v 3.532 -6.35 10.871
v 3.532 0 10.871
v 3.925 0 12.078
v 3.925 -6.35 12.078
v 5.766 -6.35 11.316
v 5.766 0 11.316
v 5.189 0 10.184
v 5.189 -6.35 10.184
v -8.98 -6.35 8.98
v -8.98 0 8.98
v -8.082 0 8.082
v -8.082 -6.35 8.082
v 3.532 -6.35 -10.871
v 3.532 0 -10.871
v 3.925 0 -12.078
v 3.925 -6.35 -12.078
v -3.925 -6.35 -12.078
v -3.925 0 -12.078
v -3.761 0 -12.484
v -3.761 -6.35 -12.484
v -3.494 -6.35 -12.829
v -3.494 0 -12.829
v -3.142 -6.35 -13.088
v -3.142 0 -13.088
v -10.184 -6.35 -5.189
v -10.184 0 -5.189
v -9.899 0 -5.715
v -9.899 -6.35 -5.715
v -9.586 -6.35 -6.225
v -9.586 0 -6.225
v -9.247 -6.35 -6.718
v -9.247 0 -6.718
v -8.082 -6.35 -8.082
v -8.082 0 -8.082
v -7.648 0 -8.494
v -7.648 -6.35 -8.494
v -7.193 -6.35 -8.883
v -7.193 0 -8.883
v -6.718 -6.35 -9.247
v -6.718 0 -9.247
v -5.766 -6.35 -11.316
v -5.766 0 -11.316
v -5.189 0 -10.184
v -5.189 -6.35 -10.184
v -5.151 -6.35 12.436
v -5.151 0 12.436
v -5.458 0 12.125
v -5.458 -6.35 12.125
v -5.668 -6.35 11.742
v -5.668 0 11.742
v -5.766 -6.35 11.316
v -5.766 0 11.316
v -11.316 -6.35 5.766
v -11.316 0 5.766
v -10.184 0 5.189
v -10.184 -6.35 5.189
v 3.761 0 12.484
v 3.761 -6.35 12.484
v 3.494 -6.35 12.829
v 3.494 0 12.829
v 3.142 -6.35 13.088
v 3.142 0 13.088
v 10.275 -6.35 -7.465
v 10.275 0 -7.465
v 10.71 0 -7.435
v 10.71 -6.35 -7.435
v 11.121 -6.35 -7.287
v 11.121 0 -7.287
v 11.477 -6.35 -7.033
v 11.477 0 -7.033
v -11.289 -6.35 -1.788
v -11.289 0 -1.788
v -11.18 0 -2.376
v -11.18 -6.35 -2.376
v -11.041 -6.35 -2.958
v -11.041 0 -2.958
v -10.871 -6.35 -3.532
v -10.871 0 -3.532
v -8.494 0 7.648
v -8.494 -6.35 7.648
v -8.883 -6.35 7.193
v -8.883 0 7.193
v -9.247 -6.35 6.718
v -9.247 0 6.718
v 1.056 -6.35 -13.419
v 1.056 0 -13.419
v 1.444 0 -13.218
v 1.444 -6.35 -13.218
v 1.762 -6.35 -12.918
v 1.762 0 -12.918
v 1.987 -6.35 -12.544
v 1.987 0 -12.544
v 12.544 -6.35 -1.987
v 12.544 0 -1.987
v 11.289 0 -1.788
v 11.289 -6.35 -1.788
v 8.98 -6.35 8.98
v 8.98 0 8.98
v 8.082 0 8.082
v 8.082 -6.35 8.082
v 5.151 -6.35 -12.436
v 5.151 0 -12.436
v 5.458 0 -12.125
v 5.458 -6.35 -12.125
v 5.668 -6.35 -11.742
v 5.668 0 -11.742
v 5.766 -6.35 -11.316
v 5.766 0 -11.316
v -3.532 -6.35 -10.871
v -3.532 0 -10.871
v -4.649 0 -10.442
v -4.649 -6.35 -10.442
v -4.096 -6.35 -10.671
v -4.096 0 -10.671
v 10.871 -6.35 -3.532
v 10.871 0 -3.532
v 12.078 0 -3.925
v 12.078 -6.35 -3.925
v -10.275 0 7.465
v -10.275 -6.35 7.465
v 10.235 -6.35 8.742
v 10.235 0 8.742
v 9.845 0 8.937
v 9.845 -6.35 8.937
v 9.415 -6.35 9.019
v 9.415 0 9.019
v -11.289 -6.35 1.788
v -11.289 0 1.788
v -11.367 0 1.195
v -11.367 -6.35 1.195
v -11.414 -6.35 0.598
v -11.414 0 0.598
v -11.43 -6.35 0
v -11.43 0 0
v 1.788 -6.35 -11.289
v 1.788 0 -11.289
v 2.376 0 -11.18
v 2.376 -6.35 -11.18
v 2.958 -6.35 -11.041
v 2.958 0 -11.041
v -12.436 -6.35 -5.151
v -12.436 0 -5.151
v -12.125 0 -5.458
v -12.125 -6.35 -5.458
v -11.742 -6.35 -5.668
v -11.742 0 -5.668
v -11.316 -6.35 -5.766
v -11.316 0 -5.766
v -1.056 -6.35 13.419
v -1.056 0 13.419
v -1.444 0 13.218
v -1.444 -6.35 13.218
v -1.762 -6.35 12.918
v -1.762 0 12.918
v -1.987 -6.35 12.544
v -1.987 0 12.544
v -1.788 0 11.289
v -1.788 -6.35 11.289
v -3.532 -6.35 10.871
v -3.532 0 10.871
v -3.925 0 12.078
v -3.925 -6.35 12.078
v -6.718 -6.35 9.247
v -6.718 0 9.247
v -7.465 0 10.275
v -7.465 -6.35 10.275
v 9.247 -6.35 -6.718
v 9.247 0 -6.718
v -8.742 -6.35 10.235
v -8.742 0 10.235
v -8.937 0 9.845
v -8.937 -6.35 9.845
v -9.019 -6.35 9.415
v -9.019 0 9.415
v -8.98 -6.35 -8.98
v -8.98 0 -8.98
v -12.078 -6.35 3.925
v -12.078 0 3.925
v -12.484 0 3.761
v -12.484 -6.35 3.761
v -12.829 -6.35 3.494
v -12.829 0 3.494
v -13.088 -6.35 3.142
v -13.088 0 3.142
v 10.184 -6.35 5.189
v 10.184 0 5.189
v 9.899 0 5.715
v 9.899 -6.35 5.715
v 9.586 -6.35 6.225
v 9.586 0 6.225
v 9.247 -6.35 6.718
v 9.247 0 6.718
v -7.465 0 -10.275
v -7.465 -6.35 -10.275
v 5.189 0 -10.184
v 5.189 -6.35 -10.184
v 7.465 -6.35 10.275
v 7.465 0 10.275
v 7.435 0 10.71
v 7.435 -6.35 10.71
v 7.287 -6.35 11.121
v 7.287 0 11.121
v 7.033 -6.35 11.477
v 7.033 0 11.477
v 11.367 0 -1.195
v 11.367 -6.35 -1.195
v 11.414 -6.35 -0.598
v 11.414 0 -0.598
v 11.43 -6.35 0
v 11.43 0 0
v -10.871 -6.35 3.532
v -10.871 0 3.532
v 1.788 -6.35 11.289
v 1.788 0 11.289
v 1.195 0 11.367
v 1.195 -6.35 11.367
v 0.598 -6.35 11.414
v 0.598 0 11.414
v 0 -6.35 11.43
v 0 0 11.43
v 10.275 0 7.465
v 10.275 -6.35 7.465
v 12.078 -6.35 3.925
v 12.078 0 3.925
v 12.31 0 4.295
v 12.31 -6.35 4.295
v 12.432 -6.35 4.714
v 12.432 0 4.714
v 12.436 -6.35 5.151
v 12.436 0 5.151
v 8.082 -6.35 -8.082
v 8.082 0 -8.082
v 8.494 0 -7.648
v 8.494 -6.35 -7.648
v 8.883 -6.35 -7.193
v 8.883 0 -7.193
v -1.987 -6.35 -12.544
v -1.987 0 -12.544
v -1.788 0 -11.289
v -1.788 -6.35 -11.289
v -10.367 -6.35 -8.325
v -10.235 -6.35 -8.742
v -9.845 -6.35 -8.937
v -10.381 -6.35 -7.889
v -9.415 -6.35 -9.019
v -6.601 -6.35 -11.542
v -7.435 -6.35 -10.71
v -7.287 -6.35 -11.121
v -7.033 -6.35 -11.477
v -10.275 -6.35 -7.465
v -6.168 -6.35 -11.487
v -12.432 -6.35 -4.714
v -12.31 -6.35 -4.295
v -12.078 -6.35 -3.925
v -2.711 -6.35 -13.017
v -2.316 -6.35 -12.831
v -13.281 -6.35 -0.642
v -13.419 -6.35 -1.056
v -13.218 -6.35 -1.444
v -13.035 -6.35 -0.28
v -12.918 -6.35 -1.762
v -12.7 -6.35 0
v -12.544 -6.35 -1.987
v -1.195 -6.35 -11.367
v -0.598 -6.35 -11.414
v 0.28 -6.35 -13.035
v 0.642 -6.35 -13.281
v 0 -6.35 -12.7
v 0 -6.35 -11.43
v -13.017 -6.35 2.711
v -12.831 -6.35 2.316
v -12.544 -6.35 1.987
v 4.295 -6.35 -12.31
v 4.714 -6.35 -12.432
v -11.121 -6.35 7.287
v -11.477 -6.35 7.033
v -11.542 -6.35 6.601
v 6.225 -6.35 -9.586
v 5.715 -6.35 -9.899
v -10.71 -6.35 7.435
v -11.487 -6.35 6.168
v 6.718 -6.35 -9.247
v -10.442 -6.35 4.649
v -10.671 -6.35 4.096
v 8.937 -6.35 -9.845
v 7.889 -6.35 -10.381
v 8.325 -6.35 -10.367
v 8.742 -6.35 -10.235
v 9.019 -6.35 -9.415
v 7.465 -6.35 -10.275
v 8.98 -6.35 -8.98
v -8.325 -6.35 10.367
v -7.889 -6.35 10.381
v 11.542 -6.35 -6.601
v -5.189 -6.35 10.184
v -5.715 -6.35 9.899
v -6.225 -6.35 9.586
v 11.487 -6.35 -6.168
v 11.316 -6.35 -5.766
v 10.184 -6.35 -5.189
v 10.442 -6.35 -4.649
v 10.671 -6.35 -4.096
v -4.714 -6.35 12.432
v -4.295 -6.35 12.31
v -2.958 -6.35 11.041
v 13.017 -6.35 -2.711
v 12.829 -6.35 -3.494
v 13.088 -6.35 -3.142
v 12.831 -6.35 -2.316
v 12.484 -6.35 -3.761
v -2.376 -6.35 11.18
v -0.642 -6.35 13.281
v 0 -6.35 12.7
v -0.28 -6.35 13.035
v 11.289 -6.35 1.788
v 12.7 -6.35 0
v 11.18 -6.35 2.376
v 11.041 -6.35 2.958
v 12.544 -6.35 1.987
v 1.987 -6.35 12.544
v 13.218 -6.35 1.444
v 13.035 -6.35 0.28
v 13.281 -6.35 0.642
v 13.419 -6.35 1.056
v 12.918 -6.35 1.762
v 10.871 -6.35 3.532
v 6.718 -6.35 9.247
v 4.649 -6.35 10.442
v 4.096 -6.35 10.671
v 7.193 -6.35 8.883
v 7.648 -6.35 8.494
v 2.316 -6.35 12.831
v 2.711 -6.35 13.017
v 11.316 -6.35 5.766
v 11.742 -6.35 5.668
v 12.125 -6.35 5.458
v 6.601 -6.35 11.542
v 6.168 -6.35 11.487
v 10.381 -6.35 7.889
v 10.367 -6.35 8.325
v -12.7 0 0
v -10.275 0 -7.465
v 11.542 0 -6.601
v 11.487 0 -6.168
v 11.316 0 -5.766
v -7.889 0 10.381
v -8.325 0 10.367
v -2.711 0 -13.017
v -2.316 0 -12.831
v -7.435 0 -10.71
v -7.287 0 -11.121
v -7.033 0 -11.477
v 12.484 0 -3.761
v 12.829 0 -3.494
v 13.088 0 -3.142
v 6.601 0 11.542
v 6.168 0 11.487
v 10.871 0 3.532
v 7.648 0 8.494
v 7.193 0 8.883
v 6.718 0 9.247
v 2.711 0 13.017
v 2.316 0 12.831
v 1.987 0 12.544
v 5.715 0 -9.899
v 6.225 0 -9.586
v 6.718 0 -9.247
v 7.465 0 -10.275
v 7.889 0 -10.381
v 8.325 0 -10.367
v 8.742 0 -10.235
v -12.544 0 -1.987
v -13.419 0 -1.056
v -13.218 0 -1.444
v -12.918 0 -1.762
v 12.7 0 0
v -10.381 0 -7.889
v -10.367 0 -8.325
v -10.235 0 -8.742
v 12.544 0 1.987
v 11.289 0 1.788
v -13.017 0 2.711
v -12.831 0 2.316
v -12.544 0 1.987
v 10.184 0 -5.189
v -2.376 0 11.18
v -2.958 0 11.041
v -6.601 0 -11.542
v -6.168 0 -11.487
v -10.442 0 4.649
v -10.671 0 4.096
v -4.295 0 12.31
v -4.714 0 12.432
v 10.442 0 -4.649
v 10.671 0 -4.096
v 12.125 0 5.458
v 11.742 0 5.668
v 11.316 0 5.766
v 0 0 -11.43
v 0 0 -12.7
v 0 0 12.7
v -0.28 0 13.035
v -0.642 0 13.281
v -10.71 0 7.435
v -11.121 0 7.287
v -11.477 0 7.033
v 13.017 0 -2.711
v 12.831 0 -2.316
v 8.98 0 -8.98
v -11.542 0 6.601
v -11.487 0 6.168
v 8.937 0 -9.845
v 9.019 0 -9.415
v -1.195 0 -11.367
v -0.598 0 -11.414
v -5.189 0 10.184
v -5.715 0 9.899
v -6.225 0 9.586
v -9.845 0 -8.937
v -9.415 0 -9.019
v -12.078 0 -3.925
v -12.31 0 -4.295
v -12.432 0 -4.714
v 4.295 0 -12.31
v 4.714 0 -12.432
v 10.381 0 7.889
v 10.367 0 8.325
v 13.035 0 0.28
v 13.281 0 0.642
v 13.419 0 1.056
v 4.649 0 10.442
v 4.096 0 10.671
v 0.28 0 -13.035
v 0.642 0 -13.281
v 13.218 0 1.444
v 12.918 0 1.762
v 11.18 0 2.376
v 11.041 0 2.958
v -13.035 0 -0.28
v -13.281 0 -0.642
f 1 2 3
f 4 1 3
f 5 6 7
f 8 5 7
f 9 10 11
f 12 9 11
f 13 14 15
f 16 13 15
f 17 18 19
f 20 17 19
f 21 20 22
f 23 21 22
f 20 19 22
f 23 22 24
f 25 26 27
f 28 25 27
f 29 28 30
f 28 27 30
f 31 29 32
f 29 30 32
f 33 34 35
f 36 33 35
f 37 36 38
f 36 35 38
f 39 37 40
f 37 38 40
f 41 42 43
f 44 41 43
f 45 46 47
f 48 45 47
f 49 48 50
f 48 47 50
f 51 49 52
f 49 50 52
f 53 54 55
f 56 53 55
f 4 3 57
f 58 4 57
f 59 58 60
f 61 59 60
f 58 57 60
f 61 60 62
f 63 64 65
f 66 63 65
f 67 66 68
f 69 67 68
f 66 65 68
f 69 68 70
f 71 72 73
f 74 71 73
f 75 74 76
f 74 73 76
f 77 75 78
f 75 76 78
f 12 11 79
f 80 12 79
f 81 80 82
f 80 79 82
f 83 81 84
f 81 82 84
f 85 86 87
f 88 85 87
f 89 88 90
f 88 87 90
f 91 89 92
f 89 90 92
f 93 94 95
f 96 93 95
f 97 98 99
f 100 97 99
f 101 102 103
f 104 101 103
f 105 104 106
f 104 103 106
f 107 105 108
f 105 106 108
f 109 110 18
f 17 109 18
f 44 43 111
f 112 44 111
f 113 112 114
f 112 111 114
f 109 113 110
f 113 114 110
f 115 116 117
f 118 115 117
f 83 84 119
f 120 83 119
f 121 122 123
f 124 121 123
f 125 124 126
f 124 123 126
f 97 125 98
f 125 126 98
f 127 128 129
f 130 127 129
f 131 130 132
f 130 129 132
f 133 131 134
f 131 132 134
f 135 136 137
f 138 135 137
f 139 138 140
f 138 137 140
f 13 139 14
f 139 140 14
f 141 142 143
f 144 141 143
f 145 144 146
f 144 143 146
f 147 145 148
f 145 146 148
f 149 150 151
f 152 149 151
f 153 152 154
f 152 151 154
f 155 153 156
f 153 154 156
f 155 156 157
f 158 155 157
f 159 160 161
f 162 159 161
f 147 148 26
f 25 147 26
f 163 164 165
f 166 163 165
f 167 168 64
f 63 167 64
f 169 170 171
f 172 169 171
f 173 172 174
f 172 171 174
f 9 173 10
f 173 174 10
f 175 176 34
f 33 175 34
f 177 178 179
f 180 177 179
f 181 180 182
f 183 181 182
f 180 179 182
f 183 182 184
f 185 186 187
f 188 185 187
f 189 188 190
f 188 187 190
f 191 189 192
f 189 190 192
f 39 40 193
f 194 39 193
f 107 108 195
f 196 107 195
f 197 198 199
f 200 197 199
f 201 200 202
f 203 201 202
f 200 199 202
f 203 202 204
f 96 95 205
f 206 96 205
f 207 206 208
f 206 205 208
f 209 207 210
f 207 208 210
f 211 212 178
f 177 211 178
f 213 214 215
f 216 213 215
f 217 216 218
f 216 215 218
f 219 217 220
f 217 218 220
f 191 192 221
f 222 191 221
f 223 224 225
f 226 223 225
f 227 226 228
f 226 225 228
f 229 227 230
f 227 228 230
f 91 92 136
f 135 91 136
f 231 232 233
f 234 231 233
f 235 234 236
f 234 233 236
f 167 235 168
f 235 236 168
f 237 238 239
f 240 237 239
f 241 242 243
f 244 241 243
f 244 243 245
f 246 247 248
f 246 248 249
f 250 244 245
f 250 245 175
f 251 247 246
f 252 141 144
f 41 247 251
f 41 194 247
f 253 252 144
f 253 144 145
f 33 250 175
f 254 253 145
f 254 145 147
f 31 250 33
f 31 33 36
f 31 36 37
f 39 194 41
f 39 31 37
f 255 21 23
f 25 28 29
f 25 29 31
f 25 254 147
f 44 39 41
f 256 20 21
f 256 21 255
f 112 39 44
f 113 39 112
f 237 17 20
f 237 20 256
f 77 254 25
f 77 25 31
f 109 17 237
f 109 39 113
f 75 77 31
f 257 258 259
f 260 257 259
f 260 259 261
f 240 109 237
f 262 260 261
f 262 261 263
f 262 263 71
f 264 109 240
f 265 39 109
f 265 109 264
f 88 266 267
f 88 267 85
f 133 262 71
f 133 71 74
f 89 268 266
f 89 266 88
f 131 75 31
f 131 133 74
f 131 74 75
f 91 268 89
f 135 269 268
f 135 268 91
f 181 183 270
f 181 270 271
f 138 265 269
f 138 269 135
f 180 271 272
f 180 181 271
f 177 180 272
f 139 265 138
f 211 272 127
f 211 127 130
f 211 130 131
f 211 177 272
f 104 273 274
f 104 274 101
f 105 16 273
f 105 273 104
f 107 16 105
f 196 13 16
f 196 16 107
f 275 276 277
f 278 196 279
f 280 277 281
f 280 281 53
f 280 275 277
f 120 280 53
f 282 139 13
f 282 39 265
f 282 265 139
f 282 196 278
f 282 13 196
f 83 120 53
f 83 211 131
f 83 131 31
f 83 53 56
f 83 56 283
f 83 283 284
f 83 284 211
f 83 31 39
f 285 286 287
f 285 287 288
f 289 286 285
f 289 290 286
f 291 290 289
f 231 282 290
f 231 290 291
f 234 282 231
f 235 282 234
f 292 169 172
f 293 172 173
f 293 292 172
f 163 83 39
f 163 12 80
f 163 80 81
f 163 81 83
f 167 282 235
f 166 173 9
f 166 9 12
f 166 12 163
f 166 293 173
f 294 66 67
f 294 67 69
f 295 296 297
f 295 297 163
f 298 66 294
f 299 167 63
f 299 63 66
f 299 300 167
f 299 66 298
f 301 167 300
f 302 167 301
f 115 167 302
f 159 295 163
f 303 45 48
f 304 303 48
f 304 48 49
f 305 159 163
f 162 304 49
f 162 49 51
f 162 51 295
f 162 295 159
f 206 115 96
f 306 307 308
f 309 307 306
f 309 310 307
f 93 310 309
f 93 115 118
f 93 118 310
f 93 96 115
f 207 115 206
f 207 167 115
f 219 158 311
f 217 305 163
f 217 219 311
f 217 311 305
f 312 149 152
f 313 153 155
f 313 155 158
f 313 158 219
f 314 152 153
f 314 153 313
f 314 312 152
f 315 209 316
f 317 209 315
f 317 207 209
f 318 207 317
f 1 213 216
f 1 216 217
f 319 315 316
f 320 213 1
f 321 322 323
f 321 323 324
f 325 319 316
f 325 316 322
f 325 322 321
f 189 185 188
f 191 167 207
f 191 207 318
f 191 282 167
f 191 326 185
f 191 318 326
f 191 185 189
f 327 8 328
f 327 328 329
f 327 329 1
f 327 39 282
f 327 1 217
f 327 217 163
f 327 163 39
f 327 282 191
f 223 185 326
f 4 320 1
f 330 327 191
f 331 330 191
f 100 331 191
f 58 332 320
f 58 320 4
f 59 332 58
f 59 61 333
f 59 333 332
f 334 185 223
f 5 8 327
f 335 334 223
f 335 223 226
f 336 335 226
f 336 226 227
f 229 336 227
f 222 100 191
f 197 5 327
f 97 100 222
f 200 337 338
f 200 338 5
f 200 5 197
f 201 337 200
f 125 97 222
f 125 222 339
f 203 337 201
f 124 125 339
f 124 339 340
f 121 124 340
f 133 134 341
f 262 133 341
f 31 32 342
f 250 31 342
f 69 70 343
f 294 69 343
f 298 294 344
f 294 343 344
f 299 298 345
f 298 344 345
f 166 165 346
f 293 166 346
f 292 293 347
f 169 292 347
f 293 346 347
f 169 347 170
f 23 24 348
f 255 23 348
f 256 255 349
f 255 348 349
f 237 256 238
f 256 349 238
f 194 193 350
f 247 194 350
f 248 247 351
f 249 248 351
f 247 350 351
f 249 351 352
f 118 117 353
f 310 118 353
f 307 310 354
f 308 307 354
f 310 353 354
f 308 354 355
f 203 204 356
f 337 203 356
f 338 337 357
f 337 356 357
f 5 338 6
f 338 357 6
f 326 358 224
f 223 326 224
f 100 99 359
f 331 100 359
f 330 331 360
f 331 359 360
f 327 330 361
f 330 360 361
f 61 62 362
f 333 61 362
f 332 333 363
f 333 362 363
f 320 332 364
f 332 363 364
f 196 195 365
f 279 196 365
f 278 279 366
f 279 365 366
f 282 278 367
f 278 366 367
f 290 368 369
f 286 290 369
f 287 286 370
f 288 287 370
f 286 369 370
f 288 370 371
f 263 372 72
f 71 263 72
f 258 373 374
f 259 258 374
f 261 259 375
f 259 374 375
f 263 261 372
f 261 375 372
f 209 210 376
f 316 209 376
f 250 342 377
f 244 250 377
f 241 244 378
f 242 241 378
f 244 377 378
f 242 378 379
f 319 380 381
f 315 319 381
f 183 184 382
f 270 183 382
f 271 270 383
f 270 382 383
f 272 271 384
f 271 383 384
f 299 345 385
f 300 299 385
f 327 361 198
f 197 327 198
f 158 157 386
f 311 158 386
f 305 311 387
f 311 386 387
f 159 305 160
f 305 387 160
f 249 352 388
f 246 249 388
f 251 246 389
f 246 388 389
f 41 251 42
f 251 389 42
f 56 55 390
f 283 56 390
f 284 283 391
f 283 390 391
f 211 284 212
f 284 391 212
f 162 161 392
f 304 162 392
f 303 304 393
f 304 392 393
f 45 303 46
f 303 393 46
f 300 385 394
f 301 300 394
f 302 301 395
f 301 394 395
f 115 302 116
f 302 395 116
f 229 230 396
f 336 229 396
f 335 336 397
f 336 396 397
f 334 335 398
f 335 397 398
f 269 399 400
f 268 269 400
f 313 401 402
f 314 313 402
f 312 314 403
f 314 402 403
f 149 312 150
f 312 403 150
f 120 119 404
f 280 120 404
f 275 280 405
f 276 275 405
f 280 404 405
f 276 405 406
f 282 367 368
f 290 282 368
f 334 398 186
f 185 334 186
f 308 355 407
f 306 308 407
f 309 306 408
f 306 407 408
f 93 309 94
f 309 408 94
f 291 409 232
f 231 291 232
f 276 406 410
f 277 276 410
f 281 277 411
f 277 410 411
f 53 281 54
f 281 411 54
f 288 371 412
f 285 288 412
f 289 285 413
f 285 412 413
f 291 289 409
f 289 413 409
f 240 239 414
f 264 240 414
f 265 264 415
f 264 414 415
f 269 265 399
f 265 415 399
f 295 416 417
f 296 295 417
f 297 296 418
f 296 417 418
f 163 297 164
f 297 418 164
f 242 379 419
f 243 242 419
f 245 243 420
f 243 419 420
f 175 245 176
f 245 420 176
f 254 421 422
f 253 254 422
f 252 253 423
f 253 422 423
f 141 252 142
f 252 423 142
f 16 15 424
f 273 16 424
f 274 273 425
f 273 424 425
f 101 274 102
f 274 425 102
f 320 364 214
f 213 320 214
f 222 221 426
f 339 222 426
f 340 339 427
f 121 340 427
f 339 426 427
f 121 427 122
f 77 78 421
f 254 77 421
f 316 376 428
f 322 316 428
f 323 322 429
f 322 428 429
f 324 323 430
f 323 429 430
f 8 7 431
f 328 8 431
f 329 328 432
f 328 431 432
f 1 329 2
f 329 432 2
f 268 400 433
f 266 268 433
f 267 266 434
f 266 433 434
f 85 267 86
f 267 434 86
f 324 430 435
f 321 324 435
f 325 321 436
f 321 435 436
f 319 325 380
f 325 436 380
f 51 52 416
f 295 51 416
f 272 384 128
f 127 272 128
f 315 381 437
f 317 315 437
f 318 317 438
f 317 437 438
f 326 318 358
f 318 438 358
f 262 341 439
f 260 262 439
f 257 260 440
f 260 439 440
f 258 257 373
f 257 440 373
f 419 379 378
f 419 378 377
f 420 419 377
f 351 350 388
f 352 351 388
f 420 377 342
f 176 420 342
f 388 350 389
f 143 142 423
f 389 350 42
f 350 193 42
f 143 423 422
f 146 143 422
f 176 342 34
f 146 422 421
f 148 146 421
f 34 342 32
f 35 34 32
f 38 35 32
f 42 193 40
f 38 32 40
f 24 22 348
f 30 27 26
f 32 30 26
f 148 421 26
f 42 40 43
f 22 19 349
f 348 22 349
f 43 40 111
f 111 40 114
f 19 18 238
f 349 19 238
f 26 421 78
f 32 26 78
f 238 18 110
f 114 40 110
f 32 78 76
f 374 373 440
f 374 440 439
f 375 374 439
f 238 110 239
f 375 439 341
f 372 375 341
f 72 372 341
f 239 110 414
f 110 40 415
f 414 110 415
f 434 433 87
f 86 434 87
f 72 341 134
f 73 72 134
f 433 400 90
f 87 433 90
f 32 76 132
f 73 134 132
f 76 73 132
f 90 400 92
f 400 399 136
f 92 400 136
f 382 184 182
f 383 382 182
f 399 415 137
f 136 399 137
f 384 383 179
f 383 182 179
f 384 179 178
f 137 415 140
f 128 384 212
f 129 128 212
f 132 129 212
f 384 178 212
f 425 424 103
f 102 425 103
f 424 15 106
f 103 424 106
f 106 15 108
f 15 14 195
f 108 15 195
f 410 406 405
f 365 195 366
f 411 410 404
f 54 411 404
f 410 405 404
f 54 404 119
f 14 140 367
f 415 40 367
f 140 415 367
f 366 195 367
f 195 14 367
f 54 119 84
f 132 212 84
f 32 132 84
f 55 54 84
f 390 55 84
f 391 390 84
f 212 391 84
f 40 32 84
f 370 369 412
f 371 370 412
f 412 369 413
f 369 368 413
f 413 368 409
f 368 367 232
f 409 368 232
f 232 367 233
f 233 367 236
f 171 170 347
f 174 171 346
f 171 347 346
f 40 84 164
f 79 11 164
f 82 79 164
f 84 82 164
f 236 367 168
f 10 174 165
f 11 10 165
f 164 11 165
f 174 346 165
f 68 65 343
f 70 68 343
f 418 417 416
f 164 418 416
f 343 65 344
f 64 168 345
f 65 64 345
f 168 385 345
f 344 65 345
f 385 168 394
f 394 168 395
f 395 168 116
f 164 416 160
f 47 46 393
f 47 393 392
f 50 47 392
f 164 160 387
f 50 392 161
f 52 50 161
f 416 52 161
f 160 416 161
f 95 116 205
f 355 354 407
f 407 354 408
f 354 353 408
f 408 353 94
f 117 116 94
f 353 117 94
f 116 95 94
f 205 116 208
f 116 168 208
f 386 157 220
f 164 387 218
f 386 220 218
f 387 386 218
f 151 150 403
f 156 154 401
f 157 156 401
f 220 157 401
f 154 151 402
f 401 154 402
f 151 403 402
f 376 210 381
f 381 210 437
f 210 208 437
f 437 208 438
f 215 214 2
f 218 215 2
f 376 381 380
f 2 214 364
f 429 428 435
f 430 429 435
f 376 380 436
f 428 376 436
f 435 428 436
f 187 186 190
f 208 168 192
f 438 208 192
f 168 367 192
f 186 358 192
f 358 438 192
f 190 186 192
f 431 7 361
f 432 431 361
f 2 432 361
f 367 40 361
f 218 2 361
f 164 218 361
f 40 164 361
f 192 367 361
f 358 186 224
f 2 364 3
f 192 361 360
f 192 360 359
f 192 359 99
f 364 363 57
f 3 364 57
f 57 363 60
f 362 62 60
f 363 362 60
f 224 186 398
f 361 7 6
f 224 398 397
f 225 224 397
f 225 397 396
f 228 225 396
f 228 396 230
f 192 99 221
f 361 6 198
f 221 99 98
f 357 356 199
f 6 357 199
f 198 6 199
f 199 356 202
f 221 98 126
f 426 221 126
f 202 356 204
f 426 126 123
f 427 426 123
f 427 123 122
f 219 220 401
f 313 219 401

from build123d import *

# Parameters (mm, degrees)
F1_DEPTH = 6.35


with BuildPart() as f1:
    # F0 (on Front) → F1 (new body)
    with BuildSketch(Plane.XZ):
        with BuildLine():
            Line((0, 11.43), (0, 12.7))
            ThreePointArc((0, 12.7), (-0.996431, 12.66085), (-1.986718, 12.543642))
            Line((-1.986718, 12.543642), (-1.788046, 11.289278))
            ThreePointArc((-1.788046, 11.289278), (-2.668281, 11.114188), (-3.532064, 10.870576))
            Line((-3.532064, 10.870576), (-3.924516, 12.078418))
            ThreePointArc((-3.924516, 12.078418), (-4.500251, 12.385881), (-5.151037, 12.435703))
            ThreePointArc((-5.151037, 12.435703), (-5.575982, 11.940298), (-5.765679, 11.315783))
            Line((-5.765679, 11.315783), (-5.189111, 10.184205))
            ThreePointArc((-5.189111, 10.184205), (-5.972159, 9.745677), (-6.718385, 9.247064))
            Line((-6.718385, 9.247064), (-7.464873, 10.274516))
            ThreePointArc((-7.464873, 10.274516), (-8.107441, 10.389019), (-8.741771, 10.235298))
            ThreePointArc((-8.741771, 10.235298), (-8.992829, 9.632825), (-8.980256, 8.980256))
            Line((-8.980256, 8.980256), (-8.082231, 8.082231))
            ThreePointArc((-8.082231, 8.082231), (-8.69144, 7.423191), (-9.247064, 6.718385))
            Line((-9.247064, 6.718385), (-10.274516, 7.464873))
            ThreePointArc((-10.274516, 7.464873), (-10.921018, 7.375207), (-11.476799, 7.032992))
            ThreePointArc((-11.476799, 7.032992), (-11.529396, 6.382424), (-11.315783, 5.765679))
            Line((-11.315783, 5.765679), (-10.184205, 5.189111))
            ThreePointArc((-10.184205, 5.189111), (-10.559943, 4.374072), (-10.870576, 3.532064))
            Line((-10.870576, 3.532064), (-12.078418, 3.924516))
            ThreePointArc((-12.078418, 3.924516), (-12.665569, 3.639458), (-13.088399, 3.142246))
            ThreePointArc((-13.088399, 3.142246), (-12.937384, 2.507267), (-12.543642, 1.986718))
            Line((-12.543642, 1.986718), (-11.289278, 1.788046))
            ThreePointArc((-11.289278, 1.788046), (-11.394765, 0.896787), (-11.43, 0))
            Line((-11.43, 0), (-12.7, 0))
            ThreePointArc((-12.7, 0), (-13.170327, -0.452545), (-13.418814, -1.056084))
            ThreePointArc((-13.418814, -1.056084), (-13.078972, -1.613319), (-12.543642, -1.986718))
            Line((-12.543642, -1.986718), (-11.289278, -1.788046))
            ThreePointArc((-11.289278, -1.788046), (-11.114188, -2.668281), (-10.870576, -3.532064))
            Line((-10.870576, -3.532064), (-12.078418, -3.924516))
            ThreePointArc((-12.078418, -3.924516), (-12.385881, -4.500251), (-12.435703, -5.151037))
            ThreePointArc((-12.435703, -5.151037), (-11.940298, -5.575982), (-11.315783, -5.765679))
            Line((-11.315783, -5.765679), (-10.184205, -5.189111))
            ThreePointArc((-10.184205, -5.189111), (-9.745677, -5.972159), (-9.247064, -6.718385))
            Line((-9.247064, -6.718385), (-10.274516, -7.464873))
            ThreePointArc((-10.274516, -7.464873), (-10.389019, -8.107441), (-10.235298, -8.741771))
            ThreePointArc((-10.235298, -8.741771), (-9.632825, -8.992829), (-8.980256, -8.980256))
            Line((-8.980256, -8.980256), (-8.082231, -8.082231))
            ThreePointArc((-8.082231, -8.082231), (-7.423191, -8.69144), (-6.718385, -9.247064))
            Line((-6.718385, -9.247064), (-7.464873, -10.274516))
            ThreePointArc((-7.464873, -10.274516), (-7.375207, -10.921018), (-7.032992, -11.476799))
            ThreePointArc((-7.032992, -11.476799), (-6.382424, -11.529396), (-5.765679, -11.315783))
            Line((-5.765679, -11.315783), (-5.189111, -10.184205))
            ThreePointArc((-5.189111, -10.184205), (-4.374072, -10.559943), (-3.532064, -10.870576))
            Line((-3.532064, -10.870576), (-3.924516, -12.078418))
            ThreePointArc((-3.924516, -12.078418), (-3.639458, -12.665569), (-3.142246, -13.088399))
            ThreePointArc((-3.142246, -13.088399), (-2.507267, -12.937384), (-1.986718, -12.543642))
            Line((-1.986718, -12.543642), (-1.788046, -11.289278))
            ThreePointArc((-1.788046, -11.289278), (-0.896787, -11.394765), (0, -11.43))
            Line((0, -11.43), (0, -12.7))
            ThreePointArc((0, -12.7), (0.452545, -13.170327), (1.056084, -13.418814))
            ThreePointArc((1.056084, -13.418814), (1.613319, -13.078972), (1.986718, -12.543642))
            Line((1.986718, -12.543642), (1.788046, -11.289278))
            ThreePointArc((1.788046, -11.289278), (2.668281, -11.114188), (3.532064, -10.870576))
            Line((3.532064, -10.870576), (3.924516, -12.078418))
            ThreePointArc((3.924516, -12.078418), (4.500251, -12.385881), (5.151037, -12.435703))
            ThreePointArc((5.151037, -12.435703), (5.575982, -11.940298), (5.765679, -11.315783))
            Line((5.765679, -11.315783), (5.189111, -10.184205))
            ThreePointArc((5.189111, -10.184205), (5.972159, -9.745677), (6.718385, -9.247064))
            Line((6.718385, -9.247064), (7.464873, -10.274516))
            ThreePointArc((7.464873, -10.274516), (8.107441, -10.389019), (8.741771, -10.235298))
            ThreePointArc((8.741771, -10.235298), (8.992829, -9.632825), (8.980256, -8.980256))
            Line((8.980256, -8.980256), (8.082231, -8.082231))
            ThreePointArc((8.082231, -8.082231), (8.69144, -7.423191), (9.247064, -6.718385))
            Line((9.247064, -6.718385), (10.274516, -7.464873))
            ThreePointArc((10.274516, -7.464873), (10.921018, -7.375207), (11.476799, -7.032992))
            ThreePointArc((11.476799, -7.032992), (11.529396, -6.382424), (11.315783, -5.765679))
            Line((11.315783, -5.765679), (10.184205, -5.189111))
            ThreePointArc((10.184205, -5.189111), (10.559943, -4.374072), (10.870576, -3.532064))
            Line((10.870576, -3.532064), (12.078418, -3.924516))
            ThreePointArc((12.078418, -3.924516), (12.665569, -3.639458), (13.088399, -3.142246))
            ThreePointArc((13.088399, -3.142246), (12.937384, -2.507267), (12.543642, -1.986718))
            Line((12.543642, -1.986718), (11.289278, -1.788046))
            ThreePointArc((11.289278, -1.788046), (11.394765, -0.896787), (11.43, 0))
            Line((11.43, 0), (12.7, 0))
            ThreePointArc((12.7, 0), (13.170327, 0.452545), (13.418814, 1.056084))
            ThreePointArc((13.418814, 1.056084), (13.078972, 1.613319), (12.543642, 1.986718))
            Line((12.543642, 1.986718), (11.289278, 1.788046))
            ThreePointArc((11.289278, 1.788046), (11.114188, 2.668281), (10.870576, 3.532064))
            Line((10.870576, 3.532064), (12.078418, 3.924516))
            ThreePointArc((12.078418, 3.924516), (12.385881, 4.500251), (12.435703, 5.151037))
            ThreePointArc((12.435703, 5.151037), (11.940298, 5.575982), (11.315783, 5.765679))
            Line((11.315783, 5.765679), (10.184205, 5.189111))
            ThreePointArc((10.184205, 5.189111), (9.745677, 5.972159), (9.247064, 6.718385))
            Line((9.247064, 6.718385), (10.274516, 7.464873))
            ThreePointArc((10.274516, 7.464873), (10.389019, 8.107441), (10.235298, 8.741771))
            ThreePointArc((10.235298, 8.741771), (9.632825, 8.992829), (8.980256, 8.980256))
            Line((8.980256, 8.980256), (8.082231, 8.082231))
            ThreePointArc((8.082231, 8.082231), (7.423191, 8.69144), (6.718385, 9.247064))
            Line((6.718385, 9.247064), (7.464873, 10.274516))
            ThreePointArc((7.464873, 10.274516), (7.375207, 10.921018), (7.032992, 11.476799))
            ThreePointArc((7.032992, 11.476799), (6.382424, 11.529396), (5.765679, 11.315783))
            Line((5.765679, 11.315783), (5.189111, 10.184205))
            ThreePointArc((5.189111, 10.184205), (4.374072, 10.559943), (3.532064, 10.870576))
            Line((3.532064, 10.870576), (3.924516, 12.078418))
            ThreePointArc((3.924516, 12.078418), (3.639458, 12.665569), (3.142246, 13.088399))
            ThreePointArc((3.142246, 13.088399), (2.507267, 12.937384), (1.986718, 12.543642))
            Line((1.986718, 12.543642), (1.788046, 11.289278))
            ThreePointArc((1.788046, 11.289278), (0.896787, 11.394765), (0, 11.43))
        make_face()
        with BuildLine():
            ThreePointArc((-1.986718, 12.543642), (-0.996431, 12.66085), (0, 12.7))
            ThreePointArc((0, 12.7), (-0.452545, 13.170327), (-1.056084, 13.418814))
            ThreePointArc((-1.056084, 13.418814), (-1.613319, 13.078972), (-1.986718, 12.543642))
        make_face()
    extrude(amount=F1_DEPTH)


solid = f1.part
